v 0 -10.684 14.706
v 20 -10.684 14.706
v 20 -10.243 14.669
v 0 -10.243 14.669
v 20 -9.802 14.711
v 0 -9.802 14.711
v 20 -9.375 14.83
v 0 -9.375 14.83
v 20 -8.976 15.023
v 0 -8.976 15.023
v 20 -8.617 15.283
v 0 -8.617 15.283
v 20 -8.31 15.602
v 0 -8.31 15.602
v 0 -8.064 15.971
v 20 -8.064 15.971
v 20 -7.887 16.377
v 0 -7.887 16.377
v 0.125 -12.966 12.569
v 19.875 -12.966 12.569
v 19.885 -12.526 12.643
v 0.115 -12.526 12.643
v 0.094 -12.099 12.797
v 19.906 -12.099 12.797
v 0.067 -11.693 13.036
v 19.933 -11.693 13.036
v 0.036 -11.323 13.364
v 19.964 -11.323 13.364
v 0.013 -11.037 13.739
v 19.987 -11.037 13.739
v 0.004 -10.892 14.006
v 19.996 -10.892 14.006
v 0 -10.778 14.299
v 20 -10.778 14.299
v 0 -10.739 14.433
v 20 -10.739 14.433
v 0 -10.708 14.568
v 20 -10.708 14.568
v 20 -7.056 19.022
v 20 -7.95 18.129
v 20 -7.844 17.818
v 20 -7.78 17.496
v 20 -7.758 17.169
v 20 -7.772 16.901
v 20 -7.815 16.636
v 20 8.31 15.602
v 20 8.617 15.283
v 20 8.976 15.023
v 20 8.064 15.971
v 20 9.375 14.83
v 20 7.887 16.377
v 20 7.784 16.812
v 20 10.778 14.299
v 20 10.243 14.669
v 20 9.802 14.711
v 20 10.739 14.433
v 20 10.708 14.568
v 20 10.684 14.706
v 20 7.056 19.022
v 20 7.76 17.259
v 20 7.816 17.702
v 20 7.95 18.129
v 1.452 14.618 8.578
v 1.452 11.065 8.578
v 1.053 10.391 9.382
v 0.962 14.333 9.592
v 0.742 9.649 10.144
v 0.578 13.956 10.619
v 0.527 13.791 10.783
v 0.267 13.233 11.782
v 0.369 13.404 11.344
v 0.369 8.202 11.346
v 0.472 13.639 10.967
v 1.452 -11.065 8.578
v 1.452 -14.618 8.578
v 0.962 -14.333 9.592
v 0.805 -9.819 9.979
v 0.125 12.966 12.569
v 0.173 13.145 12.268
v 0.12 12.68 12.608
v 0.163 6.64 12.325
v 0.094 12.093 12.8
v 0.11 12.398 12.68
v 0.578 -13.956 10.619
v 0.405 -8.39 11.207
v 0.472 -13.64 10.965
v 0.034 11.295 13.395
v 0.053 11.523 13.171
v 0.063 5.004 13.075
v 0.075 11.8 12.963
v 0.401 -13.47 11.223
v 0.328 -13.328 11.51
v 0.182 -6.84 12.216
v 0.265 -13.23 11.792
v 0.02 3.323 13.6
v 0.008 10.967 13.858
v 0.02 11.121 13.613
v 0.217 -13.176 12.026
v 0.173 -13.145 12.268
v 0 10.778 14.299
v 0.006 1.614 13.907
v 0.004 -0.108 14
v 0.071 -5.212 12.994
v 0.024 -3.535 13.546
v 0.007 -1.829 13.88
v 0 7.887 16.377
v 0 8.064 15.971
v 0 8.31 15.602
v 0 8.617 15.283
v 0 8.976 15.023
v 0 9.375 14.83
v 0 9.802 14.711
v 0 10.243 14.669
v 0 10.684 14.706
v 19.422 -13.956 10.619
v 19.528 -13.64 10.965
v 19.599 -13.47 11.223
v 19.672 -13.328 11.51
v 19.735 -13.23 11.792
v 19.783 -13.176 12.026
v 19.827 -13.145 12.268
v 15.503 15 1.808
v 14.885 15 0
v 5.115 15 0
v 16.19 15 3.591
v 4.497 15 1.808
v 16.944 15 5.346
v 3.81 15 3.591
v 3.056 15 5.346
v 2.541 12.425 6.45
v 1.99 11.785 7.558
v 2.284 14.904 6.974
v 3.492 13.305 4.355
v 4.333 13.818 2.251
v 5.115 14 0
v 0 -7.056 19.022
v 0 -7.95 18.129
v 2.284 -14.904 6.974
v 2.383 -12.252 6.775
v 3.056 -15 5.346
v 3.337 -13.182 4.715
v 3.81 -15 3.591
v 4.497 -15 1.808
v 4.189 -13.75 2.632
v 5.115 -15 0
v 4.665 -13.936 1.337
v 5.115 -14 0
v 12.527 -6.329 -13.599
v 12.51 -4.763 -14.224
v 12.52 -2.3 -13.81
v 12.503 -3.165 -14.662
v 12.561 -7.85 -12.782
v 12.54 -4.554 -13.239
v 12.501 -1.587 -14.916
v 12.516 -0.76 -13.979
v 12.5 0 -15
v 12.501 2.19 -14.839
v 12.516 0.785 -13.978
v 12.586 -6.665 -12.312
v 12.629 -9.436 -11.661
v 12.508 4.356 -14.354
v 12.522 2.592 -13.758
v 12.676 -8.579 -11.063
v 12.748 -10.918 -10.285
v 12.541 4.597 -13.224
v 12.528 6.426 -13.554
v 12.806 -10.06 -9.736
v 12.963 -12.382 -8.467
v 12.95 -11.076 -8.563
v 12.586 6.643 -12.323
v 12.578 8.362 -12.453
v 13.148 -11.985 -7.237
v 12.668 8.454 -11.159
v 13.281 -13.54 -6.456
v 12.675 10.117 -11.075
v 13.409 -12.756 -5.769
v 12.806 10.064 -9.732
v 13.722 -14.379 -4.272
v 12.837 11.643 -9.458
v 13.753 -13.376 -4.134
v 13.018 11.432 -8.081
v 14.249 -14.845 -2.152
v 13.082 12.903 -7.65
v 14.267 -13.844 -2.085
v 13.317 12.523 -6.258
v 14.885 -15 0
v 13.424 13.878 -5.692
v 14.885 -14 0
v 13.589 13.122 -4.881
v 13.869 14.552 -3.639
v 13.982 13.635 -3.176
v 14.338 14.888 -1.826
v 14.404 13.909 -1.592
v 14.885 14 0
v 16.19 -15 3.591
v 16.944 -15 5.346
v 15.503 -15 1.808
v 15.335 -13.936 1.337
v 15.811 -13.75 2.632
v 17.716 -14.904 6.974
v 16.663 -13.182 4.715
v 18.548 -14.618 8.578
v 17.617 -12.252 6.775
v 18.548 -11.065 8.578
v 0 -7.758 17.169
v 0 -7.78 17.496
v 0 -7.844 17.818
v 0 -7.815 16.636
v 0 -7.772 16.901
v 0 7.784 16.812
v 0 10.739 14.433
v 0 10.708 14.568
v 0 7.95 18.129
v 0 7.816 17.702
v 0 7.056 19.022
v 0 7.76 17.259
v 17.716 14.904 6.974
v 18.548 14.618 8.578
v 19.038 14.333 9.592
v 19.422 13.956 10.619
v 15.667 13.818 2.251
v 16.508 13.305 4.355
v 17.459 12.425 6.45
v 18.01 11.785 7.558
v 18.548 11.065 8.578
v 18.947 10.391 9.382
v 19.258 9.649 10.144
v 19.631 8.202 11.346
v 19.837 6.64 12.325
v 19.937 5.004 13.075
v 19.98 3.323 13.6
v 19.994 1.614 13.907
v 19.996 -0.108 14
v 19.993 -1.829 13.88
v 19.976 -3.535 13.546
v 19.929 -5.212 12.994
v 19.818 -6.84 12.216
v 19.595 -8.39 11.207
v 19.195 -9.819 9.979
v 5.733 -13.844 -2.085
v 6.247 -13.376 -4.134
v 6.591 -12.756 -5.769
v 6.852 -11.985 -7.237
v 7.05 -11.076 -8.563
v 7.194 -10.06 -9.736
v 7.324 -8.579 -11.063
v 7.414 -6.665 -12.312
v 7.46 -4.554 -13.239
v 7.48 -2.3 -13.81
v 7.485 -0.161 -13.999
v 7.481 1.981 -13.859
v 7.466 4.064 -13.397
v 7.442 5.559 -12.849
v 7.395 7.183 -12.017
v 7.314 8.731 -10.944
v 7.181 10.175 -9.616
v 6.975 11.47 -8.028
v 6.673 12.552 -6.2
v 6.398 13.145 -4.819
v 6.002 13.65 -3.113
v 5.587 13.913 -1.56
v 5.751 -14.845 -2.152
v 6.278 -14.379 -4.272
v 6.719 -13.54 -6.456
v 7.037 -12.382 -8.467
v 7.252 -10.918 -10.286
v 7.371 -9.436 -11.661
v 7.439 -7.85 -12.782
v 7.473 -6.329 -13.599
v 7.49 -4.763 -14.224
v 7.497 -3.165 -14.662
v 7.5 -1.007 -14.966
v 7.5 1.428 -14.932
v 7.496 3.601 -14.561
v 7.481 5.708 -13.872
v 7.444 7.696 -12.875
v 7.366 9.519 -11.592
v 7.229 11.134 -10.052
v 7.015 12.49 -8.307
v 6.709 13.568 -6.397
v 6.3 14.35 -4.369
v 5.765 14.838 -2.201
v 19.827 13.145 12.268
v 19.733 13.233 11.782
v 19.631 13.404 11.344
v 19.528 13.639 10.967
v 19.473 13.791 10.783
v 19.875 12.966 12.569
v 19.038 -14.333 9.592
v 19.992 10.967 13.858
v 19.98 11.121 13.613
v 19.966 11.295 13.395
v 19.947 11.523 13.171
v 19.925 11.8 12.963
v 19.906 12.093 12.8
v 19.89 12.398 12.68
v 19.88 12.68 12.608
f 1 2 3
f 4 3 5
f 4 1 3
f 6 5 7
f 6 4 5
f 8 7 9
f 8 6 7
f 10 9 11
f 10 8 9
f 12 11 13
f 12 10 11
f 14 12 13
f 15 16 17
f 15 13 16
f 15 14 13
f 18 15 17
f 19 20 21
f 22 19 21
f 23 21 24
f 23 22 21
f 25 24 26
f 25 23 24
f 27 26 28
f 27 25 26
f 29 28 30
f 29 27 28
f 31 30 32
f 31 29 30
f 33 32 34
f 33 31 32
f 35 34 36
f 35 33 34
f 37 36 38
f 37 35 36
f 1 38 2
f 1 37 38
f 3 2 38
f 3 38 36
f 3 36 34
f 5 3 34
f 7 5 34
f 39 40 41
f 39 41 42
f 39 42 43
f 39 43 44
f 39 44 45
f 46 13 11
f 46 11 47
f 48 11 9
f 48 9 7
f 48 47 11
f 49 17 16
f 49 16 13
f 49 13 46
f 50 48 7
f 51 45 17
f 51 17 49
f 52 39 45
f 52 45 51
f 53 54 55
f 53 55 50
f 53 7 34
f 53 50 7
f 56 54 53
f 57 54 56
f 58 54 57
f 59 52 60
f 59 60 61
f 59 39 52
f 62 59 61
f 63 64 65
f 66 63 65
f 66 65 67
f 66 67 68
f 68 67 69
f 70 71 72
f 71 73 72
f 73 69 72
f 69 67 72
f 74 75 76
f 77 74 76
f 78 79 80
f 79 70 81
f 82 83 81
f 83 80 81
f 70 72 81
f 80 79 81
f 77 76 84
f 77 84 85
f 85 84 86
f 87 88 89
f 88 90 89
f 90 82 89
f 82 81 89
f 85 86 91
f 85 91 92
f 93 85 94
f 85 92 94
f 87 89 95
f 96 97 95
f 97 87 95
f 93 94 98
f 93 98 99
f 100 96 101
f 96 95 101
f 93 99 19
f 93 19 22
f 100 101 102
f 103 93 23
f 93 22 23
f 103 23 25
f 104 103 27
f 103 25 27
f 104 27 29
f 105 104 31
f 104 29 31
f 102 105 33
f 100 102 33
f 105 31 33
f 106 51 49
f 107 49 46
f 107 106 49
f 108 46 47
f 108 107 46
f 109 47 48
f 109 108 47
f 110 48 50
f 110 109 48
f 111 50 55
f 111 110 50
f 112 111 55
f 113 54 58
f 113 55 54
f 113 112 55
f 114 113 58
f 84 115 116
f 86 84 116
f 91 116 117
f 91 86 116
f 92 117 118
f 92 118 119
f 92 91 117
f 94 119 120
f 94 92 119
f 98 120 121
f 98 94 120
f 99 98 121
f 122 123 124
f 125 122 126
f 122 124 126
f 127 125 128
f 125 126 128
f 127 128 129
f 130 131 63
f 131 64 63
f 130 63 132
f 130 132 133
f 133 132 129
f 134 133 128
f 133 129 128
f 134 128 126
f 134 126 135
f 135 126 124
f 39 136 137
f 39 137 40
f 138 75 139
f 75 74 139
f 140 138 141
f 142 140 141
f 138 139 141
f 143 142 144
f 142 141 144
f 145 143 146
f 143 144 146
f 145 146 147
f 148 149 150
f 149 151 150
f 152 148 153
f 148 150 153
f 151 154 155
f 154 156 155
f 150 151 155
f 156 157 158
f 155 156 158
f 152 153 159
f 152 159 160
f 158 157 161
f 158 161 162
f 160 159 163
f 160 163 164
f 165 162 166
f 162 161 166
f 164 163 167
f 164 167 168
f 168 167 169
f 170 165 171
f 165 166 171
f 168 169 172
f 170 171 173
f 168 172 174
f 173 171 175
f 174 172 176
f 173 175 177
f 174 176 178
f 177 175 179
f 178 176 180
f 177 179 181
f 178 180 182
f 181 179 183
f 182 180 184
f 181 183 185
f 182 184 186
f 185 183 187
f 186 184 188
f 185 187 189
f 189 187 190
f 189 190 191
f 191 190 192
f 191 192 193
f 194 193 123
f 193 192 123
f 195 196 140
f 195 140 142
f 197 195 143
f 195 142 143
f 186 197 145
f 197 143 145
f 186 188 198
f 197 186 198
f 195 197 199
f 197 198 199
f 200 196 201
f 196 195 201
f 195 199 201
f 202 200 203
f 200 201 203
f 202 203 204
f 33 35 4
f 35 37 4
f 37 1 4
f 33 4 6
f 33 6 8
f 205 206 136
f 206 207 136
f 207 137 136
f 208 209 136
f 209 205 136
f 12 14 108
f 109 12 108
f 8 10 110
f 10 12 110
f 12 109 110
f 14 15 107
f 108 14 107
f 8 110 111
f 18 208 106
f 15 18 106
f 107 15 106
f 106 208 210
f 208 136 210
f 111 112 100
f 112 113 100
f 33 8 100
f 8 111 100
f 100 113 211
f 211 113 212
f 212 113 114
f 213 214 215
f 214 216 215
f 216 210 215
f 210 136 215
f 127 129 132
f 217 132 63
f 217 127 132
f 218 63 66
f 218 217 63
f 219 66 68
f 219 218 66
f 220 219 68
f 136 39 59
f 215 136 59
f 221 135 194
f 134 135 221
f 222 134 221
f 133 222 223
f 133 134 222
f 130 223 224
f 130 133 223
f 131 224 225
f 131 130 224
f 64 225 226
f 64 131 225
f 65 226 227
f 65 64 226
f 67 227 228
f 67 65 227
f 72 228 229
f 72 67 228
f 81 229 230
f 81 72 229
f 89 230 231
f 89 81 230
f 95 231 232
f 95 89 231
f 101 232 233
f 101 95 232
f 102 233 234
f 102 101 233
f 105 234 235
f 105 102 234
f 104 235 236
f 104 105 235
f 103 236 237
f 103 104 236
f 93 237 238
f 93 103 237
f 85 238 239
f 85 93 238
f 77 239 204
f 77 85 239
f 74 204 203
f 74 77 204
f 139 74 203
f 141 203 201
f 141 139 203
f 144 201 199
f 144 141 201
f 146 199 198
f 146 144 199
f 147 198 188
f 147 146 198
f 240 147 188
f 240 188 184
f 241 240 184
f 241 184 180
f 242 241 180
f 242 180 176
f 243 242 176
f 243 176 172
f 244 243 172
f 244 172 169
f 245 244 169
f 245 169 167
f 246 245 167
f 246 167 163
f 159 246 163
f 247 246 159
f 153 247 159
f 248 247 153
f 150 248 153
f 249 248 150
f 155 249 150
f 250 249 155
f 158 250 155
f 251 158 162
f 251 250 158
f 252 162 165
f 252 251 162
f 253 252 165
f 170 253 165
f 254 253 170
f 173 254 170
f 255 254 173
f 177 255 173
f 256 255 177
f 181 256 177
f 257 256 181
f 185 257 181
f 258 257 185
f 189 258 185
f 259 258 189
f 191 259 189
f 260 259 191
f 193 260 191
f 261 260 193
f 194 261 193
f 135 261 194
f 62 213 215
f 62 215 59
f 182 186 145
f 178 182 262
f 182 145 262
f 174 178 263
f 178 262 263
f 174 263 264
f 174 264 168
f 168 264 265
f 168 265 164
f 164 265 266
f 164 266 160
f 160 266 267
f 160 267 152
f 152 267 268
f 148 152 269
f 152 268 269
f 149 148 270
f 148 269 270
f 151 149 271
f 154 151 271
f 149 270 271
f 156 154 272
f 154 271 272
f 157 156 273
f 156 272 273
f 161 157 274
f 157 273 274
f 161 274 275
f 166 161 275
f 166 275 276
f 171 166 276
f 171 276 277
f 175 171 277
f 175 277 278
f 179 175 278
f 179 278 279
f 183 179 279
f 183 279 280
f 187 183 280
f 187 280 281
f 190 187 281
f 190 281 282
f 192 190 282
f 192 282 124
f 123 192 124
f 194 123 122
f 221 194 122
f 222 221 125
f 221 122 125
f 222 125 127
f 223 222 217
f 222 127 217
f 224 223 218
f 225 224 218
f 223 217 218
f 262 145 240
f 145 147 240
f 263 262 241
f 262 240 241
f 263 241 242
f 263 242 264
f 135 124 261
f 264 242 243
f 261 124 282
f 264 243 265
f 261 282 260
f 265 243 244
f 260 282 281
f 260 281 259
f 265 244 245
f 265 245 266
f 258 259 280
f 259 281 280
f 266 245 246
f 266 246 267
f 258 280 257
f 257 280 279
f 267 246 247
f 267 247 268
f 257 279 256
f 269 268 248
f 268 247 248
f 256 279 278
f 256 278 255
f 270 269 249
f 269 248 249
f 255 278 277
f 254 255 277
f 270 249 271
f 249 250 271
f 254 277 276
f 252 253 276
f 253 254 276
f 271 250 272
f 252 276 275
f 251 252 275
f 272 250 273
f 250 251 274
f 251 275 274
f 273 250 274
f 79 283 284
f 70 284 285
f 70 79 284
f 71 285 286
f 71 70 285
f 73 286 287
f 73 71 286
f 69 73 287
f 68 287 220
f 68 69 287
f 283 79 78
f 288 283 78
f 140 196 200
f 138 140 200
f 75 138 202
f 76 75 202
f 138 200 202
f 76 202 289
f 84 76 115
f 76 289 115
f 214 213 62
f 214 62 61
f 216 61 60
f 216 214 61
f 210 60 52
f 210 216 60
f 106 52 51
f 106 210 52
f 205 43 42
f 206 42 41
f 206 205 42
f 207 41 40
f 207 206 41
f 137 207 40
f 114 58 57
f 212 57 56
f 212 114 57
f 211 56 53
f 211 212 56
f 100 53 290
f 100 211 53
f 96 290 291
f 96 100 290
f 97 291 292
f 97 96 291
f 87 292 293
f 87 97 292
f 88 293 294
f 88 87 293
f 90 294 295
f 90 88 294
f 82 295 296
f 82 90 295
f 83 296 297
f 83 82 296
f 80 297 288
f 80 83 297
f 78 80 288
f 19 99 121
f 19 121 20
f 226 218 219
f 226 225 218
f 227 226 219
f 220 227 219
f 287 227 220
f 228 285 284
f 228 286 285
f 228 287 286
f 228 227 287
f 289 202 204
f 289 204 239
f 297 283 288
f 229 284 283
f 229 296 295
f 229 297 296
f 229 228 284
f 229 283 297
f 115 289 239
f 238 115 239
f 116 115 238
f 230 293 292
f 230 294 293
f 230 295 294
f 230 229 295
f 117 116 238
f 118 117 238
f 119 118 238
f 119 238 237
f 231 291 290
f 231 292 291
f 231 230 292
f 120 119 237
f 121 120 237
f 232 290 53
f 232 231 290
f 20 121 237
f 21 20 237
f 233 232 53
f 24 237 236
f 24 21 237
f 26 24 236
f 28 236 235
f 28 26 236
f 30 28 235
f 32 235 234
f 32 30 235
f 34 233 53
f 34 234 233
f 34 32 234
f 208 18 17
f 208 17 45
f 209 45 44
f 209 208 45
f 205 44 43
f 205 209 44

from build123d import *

# Parameters (mm, degrees)
F0_R      = 14
F1_DEPTH  = 20
F2_SIZE   = 10
F4_DEPTH  = 38.6586394161
F5_R      = 13.8386431078
F6_F1_R   = 12
F6_F2_R   = 12
F7_W      = 49.8866699636
F7_H      = 41.0156846046
F8_DEPTH  = 38.5990254581
F10_DEPTH = 25


with BuildPart() as f1:
    # F0 (on Right) → F1 (new body)
    with BuildSketch(Plane.YZ):
        with BuildLine():
            Line((-15, 21.0786387324), (-15, 0))
            ThreePointArc((-15, 0), (0, -15), (15, 0))
            Line((15, 0), (15, 21.0786387324))
            Line((15, 21.0786387324), (-15, 21.0786387324))
        make_face()
        Circle(F0_R, mode=Mode.SUBTRACT)
    extrude(amount=F1_DEPTH)

    # F2
    f2_edges = [f1.edges().sort_by_distance(p)[0] for p in [
        (10, -15, 21.078639),
        (10, 15, 21.078639),
    ]]
    chamfer(f2_edges, length=F2_SIZE)

    # F3 (on face) → F4 (cut)
    with BuildSketch(Plane(origin=(0, 15, 0), x_dir=(-1, 0, 0), z_dir=(0, 1, 0))):
        with BuildLine():
            Line((-5.1145853621, 0), (0, 0))
            Line((0, 0), (0, 11.0786387324))
            ThreePointArc((0, 11.0786387324), (-2.8965213104, 5.6959282984), (-5.1145853621, 0))
        make_face()
        with BuildLine():
            Line((-20, 0), (-14.8854146379, 0))
            ThreePointArc((-14.8854146379, 0), (-17.1034786896, 5.6959282984), (-20, 11.0786387324))
            Line((-20, 11.0786387324), (-20, 0))
        make_face()
        with BuildLine():
            Line((-20, -15), (-12.5, -15))
            ThreePointArc((-12.5, -15), (-13.1198156851, -7.4088943941), (-14.8854146379, 0))
            Line((-14.8854146379, 0), (-20, 0))
            Line((-20, 0), (-20, -15))
        make_face()
        with BuildLine():
            Line((-7.5, -15), (0, -15))
            Line((0, -15), (0, 0))
            Line((0, 0), (-5.1145853621, 0))
            ThreePointArc((-5.1145853621, 0), (-6.8801843149, -7.4088943941), (-7.5, -15))
        make_face()
    extrude(amount=-F4_DEPTH, mode=Mode.SUBTRACT)

    # F5
    f5_edges = [f1.edges().sort_by_distance(p)[0] for p in [
        (10, 15, 11.078639),
        (10, -15, 11.078639),
    ]]
    fillet(f5_edges, radius=F5_R)

    # F6: fillet of radius 12 on 4 edges, made by hand

    # F6_f1
    f6_f1_edges = [f1.edges().sort_by_distance(p)[0] for p in [
        (0, -11.1582173276, 11.0786387324),
    ]]
    fillet(f6_f1_edges, radius=F6_F1_R)

    # F6_f2
    f6_f2_edges = [f1.edges().sort_by_distance(p)[0] for p in [
        (20, -11.1582173276, 11.0786387324),
    ]]
    fillet(f6_f2_edges, radius=F6_F2_R)

    # F7 (on Right) → F8 (cut, symmetric)
    with BuildSketch(Plane.YZ):
        with Locations((-1.9184369594, 39.5302809775)):
            Rectangle(F7_W, F7_H)
    extrude(amount=F8_DEPTH, both=True, mode=Mode.SUBTRACT)

    # F9 (on Right) → F10 (cut)
    with BuildSketch(Plane.YZ):
        with BuildLine():
            ThreePointArc((13.1383126183, 12.5615130593), (13.6820509432, 10.9110715325), (15.1701192952, 10.0137080727))
            ThreePointArc((15.1701192952, 10.0137080727), (15.5705478949, 10.9205773773), (16.2919620049, 11.6005161105))
            ThreePointArc((16.2919620049, 11.6005161105), (15.6366296494, 12.4697960372), (14.9349695532, 13.3021308235))
            ThreePointArc((14.9349695532, 13.3021308235), (14.111548562, 12.7501046734), (13.1383126183, 12.5615130593))
        make_face()
        with BuildLine():
            ThreePointArc((10.6842297635, 14.7055806807), (11.5139277039, 13.1787506551), (13.1383126183, 12.5615130593))
            ThreePointArc((13.1383126183, 12.5615130593), (13.3703783986, 13.5253078885), (13.9587913382, 14.3231331899))
            ThreePointArc((13.9587913382, 14.3231331899), (13.1587745188, 15.0614293201), (12.3197712741, 15.755101896))
            ThreePointArc((12.3197712741, 15.755101896), (11.6081510723, 15.0649195379), (10.6842297635, 14.7055806807))
        make_face()
        with BuildLine():
            ThreePointArc((11.1769736326, 16.5853929835), (10.7404739393, 15.6953238755), (10.6842297635, 14.7055806807))
            ThreePointArc((10.6842297635, 14.7055806807), (11.6081510723, 15.0649195379), (12.3197712741, 15.755101896))
            ThreePointArc((12.3197712741, 15.755101896), (11.7557050458, 16.1803398875), (11.1769736326, 16.5853929835))
        make_face()
        with BuildLine():
            ThreePointArc((7.8867469732, 16.3769988391), (8.9757373546, 15.022853888), (10.6842297635, 14.7055806807))
            ThreePointArc((10.6842297635, 14.7055806807), (10.7404739393, 15.6953238755), (11.1769736326, 16.5853929835))
            ThreePointArc((11.1769736326, 16.5853929835), (10.2579855481, 17.168975872), (9.3086054096, 17.7016910302))
            ThreePointArc((9.3086054096, 17.7016910302), (8.7316580559, 16.895535493), (7.8867469732, 16.3769988391))
        make_face()
        with BuildLine():
            ThreePointArc((8.0359187979, 18.3145846001), (7.7653618104, 17.3608792391), (7.8867469732, 16.3769988391))
            ThreePointArc((7.8867469732, 16.3769988391), (8.7316580559, 16.895535493), (9.3086054096, 17.7016910302))
            ThreePointArc((9.3086054096, 17.7016910302), (8.6776747824, 18.019377358), (8.0359187979, 18.3145846001))
        make_face()
        with BuildLine():
            ThreePointArc((-9.3086054096, 17.7016910302), (-8.7316580559, 16.895535493), (-7.8867469732, 16.3769988391))
            ThreePointArc((-7.8867469732, 16.3769988391), (-7.7903858604, 16.7677879095), (-7.7579855481, 17.168975872))
            ThreePointArc((-7.7579855481, 17.168975872), (-7.8284622538, 17.758396403), (-8.0359187979, 18.3145846001))
            ThreePointArc((-8.0359187979, 18.3145846001), (-8.6776747824, 18.019377358), (-9.3086054096, 17.7016910302))
        make_face()
        with BuildLine():
            ThreePointArc((-10.6842297635, 14.7055806807), (-8.9757373546, 15.022853888), (-7.8867469732, 16.3769988391))
            ThreePointArc((-7.8867469732, 16.3769988391), (-8.7316580559, 16.895535493), (-9.3086054096, 17.7016910302))
            ThreePointArc((-9.3086054096, 17.7016910302), (-10.2579855481, 17.168975872), (-11.1769736326, 16.5853929835))
            ThreePointArc((-11.1769736326, 16.5853929835), (-10.79186702, 15.8662578063), (-10.6587745188, 15.0614293201))
            ThreePointArc((-10.6587745188, 15.0614293201), (-10.6651464503, 14.883050353), (-10.6842297635, 14.7055806807))
        make_face()
        with BuildLine():
            ThreePointArc((-12.3197712741, 15.755101896), (-11.6081510723, 15.0649195379), (-10.6842297635, 14.7055806807))
            ThreePointArc((-10.6842297635, 14.7055806807), (-10.6651464503, 14.883050353), (-10.6587745188, 15.0614293201))
            ThreePointArc((-10.6587745188, 15.0614293201), (-10.79186702, 15.8662578063), (-11.1769736326, 16.5853929835))
            ThreePointArc((-11.1769736326, 16.5853929835), (-11.7557050458, 16.1803398875), (-12.3197712741, 15.755101896))
        make_face()
        with BuildLine():
            ThreePointArc((-13.1383126183, 12.5615130593), (-11.5139277039, 13.1787506551), (-10.6842297635, 14.7055806807))
            ThreePointArc((-10.6842297635, 14.7055806807), (-11.6081510723, 15.0649195379), (-12.3197712741, 15.755101896))
            ThreePointArc((-12.3197712741, 15.755101896), (-13.1587745188, 15.0614293201), (-13.9587913382, 14.3231331899))
            ThreePointArc((-13.9587913382, 14.3231331899), (-13.3703783986, 13.5253078885), (-13.1383126183, 12.5615130593))
        make_face()
        with BuildLine():
            ThreePointArc((-13.1366296494, 12.4697960372), (-13.137050427, 12.5156622681), (-13.1383126183, 12.5615130593))
            ThreePointArc((-13.1383126183, 12.5615130593), (-14.111548562, 12.7501046734), (-14.9349695532, 13.3021308235))
            ThreePointArc((-14.9349695532, 13.3021308235), (-15.6366296494, 12.4697960372), (-16.2919620049, 11.6005161105))
            ThreePointArc((-16.2919620049, 11.6005161105), (-15.5705478949, 10.9205773773), (-15.1701192952, 10.0137080727))
            ThreePointArc((-15.1701192952, 10.0137080727), (-13.7109770476, 10.8754742198), (-13.1366296494, 12.4697960372))
        make_face()
    extrude(amount=F10_DEPTH, mode=Mode.SUBTRACT)


solid = f1.part
